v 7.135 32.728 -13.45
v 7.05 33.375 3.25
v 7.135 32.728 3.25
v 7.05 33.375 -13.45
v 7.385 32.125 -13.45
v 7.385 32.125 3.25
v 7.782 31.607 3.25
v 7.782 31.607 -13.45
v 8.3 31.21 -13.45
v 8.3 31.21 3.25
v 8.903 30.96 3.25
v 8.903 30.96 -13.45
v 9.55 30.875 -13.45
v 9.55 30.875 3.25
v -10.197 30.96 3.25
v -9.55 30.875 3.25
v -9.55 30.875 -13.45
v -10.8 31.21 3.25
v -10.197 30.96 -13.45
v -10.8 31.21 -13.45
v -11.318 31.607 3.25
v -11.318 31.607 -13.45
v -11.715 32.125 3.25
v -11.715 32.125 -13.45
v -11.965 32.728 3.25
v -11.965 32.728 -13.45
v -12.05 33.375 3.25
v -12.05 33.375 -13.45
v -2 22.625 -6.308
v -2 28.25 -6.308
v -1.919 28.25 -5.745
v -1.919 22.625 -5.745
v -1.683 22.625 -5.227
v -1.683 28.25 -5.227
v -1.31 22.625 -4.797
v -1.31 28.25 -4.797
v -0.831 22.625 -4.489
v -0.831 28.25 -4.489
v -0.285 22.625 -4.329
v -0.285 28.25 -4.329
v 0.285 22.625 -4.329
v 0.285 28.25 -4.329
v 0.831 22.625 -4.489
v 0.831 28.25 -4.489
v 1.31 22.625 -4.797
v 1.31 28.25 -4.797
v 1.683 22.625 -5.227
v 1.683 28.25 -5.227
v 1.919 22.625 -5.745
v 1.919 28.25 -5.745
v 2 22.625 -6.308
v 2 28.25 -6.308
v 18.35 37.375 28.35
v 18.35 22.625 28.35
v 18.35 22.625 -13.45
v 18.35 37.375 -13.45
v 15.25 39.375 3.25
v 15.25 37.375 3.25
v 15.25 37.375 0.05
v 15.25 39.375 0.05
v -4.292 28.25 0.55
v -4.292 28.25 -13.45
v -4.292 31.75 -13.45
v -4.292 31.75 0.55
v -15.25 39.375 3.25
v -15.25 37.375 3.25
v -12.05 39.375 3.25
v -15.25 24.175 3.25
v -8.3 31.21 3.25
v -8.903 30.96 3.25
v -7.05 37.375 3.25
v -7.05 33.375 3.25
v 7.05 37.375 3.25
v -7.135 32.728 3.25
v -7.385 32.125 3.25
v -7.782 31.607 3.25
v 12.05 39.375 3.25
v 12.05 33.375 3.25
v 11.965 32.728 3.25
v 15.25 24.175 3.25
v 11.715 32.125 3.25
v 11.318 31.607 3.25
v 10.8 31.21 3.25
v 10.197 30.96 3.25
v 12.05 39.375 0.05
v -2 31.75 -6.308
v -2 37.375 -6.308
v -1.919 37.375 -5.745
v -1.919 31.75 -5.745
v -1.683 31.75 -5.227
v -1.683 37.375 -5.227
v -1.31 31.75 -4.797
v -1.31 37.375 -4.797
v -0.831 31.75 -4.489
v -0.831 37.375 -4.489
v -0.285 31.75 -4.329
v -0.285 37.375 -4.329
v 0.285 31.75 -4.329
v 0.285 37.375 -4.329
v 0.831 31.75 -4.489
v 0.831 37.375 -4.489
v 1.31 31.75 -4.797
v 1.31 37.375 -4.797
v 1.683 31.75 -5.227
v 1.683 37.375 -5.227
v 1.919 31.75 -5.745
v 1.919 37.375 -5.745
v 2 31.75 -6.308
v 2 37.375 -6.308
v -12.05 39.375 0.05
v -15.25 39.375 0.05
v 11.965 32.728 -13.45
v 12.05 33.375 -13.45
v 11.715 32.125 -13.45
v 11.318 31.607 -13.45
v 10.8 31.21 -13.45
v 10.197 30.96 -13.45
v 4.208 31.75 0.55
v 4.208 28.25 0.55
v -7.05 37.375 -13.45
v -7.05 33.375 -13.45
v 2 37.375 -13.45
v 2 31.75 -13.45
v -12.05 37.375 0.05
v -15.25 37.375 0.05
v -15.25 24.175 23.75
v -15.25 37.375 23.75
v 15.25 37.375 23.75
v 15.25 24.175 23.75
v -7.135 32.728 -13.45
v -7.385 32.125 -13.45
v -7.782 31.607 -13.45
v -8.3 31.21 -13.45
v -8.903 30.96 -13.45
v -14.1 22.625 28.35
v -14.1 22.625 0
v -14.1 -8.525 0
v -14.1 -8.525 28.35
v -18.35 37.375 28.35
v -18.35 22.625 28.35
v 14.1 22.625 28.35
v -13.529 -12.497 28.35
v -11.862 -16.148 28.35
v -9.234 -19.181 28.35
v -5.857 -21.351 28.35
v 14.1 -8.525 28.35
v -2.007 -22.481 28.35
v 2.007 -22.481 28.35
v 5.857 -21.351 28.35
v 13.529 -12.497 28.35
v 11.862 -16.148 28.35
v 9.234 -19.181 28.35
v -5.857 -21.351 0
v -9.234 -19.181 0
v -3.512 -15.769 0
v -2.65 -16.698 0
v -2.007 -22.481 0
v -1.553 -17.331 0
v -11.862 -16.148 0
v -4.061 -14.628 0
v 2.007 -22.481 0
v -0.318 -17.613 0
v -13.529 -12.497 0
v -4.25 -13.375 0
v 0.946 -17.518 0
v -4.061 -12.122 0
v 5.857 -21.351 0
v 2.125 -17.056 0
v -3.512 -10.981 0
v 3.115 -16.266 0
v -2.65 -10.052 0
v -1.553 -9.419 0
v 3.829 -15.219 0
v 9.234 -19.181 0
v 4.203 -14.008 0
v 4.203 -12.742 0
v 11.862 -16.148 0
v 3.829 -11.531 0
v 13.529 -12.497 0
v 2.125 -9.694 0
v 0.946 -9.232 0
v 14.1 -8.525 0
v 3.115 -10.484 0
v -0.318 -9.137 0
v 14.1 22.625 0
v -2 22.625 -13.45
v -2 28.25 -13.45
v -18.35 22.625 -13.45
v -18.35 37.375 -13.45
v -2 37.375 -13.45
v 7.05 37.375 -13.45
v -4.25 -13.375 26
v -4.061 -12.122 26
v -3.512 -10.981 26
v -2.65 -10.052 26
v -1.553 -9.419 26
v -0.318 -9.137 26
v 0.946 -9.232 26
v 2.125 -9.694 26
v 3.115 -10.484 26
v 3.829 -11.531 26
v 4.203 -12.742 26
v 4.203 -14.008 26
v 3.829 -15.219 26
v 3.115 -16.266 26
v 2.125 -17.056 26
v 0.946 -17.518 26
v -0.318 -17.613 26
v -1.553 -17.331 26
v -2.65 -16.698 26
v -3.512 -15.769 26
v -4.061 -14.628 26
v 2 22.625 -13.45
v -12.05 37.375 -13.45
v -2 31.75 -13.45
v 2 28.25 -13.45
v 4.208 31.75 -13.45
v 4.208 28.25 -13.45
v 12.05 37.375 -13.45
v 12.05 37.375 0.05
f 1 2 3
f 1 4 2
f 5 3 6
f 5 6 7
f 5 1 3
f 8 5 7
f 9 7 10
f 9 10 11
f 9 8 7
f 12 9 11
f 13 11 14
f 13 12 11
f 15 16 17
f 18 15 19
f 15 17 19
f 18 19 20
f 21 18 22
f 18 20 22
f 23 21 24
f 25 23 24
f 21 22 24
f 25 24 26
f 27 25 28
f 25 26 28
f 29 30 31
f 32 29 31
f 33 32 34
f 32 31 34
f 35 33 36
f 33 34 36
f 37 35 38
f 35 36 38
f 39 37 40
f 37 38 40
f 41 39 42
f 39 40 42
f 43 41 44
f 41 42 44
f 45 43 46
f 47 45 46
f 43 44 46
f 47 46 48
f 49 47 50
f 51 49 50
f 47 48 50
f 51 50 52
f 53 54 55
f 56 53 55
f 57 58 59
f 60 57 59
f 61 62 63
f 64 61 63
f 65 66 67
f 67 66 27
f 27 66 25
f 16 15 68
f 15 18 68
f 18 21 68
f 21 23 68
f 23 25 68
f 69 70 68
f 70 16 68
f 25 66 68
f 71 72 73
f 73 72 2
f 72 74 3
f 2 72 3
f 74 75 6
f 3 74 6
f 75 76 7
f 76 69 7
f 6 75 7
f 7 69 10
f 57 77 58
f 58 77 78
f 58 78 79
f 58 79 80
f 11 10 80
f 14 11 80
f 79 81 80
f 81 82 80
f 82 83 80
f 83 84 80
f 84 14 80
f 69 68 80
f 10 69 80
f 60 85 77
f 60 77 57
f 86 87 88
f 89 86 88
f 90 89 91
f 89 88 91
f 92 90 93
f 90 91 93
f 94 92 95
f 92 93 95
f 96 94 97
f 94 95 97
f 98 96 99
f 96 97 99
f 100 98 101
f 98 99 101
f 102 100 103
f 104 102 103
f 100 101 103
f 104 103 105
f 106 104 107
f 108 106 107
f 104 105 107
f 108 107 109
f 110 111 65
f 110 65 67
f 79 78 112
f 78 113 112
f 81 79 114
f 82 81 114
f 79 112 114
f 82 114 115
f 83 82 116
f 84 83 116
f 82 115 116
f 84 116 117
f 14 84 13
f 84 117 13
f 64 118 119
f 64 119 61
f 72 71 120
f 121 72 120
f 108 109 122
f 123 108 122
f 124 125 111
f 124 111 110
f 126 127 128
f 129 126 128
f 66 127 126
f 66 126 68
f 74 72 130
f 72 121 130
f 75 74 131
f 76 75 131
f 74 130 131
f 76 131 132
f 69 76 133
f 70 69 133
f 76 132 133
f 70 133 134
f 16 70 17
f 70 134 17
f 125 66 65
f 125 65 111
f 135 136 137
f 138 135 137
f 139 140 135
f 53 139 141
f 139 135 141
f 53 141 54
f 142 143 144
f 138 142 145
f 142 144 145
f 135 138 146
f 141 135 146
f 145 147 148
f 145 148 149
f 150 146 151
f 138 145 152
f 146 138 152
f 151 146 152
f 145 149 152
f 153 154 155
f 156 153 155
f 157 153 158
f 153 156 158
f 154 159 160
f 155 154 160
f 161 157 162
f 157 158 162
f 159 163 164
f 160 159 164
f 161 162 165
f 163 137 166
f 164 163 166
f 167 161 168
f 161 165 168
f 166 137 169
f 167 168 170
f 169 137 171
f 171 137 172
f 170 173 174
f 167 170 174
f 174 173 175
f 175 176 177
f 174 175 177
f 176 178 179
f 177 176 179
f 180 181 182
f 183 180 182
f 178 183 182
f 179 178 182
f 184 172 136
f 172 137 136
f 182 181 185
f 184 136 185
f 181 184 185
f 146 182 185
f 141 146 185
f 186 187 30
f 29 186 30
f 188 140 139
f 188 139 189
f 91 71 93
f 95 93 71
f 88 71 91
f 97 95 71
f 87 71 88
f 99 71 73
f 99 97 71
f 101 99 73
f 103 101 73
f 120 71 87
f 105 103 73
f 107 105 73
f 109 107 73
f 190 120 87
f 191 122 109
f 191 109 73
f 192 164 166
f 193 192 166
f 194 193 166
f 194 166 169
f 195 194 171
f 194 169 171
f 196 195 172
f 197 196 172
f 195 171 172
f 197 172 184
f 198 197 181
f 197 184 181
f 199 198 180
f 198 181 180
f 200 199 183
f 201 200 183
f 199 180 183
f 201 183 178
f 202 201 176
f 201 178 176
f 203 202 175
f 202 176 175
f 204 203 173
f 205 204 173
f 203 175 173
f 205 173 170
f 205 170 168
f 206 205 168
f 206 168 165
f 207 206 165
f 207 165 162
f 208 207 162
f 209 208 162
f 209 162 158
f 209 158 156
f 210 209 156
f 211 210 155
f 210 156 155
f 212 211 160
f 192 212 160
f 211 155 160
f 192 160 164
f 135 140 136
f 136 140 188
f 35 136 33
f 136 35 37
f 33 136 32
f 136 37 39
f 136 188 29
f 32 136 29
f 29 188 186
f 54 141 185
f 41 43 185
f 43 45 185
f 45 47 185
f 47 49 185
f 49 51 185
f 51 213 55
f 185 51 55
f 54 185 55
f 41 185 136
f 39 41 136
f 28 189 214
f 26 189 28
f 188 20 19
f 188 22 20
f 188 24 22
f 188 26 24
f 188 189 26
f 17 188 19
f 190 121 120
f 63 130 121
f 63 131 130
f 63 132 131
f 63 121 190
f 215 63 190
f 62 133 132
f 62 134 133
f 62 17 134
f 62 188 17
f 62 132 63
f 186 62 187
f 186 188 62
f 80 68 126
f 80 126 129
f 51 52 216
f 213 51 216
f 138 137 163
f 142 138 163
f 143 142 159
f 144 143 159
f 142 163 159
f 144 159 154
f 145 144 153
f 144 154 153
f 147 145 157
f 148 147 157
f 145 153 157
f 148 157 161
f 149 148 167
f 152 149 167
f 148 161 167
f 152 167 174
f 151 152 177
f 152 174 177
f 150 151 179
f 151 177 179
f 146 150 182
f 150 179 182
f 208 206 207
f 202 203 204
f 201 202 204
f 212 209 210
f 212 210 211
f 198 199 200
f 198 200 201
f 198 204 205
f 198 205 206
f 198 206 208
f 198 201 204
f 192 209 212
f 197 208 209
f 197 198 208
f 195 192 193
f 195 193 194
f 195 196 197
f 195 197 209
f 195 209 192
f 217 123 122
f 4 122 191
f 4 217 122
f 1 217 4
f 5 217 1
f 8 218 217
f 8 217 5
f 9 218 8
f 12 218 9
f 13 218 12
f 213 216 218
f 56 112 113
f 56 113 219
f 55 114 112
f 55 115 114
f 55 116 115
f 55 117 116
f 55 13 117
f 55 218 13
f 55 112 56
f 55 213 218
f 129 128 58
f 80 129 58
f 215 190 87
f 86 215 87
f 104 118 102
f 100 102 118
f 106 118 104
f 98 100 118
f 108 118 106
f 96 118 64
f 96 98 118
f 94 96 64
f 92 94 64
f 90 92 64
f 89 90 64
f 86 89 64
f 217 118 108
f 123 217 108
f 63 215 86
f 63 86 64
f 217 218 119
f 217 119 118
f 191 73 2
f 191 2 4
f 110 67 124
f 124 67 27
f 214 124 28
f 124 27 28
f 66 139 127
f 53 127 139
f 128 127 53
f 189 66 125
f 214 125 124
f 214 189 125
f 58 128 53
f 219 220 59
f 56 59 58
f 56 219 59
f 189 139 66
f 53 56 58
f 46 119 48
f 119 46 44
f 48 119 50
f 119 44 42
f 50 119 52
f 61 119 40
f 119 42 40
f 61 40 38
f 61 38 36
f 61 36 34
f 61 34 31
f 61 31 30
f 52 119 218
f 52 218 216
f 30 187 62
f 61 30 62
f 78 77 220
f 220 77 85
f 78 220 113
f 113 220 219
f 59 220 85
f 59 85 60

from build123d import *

# Parameters (mm, degrees)
RESSALTO_EXTRUS_O1_DEPTH = 28.35
ESBO_O2_R                = 4.25
CORTE_EXTRUS_O1_DEPTH    = 26
ESBO_O3_W                = 36.7
ESBO_O3_H                = 41.8
RESSALTO_EXTRUS_O2_DEPTH = 14.75
ESBO_O5_W                = 30.5
ESBO_O5_H                = 20.5
CORTE_EXTRUS_O2_DEPTH    = 13.2
CORTE_EXTRUS_O3_DEPTH    = 69.850889609
ESBO_O7_W                = 5
ESBO_O7_H                = 16.7
CORTE_EXTRUS_O4_DEPTH    = 6.5
FILETE1_R                = 2.5
ESBO_O8_W                = 8.5
ESBO_O8_H                = 3.5
CORTE_EXTRUS_O5_DEPTH    = 14
ESBO_O9_W                = 3.2
ESBO_O9_H                = 3.2
RESSALTO_EXTRUS_O3_DEPTH = 2


with BuildPart() as part:
    # Esboço1 → Ressalto-extrusão1 (new body)
    with BuildSketch(Plane.XY):
        with BuildLine():
            Line((14.1, -8.525), (14.1, 22.625))
            Line((14.1, 22.625), (-14.1, 22.625))
            Line((-14.1, 22.625), (-14.1, -8.525))
            ThreePointArc((-14.1, -8.525), (0, -22.625), (14.1, -8.525))
        make_face()
    extrude(amount=RESSALTO_EXTRUS_O1_DEPTH)

    # Esboço2 → Corte-extrusão1 (cut)
    with BuildSketch(Plane(origin=(0, 0, 0), x_dir=(-1, 0, 0), z_dir=(0, 0, -1))):
        with Locations((0, -13.375)):
            Circle(ESBO_O2_R)
    extrude(amount=-CORTE_EXTRUS_O1_DEPTH, mode=Mode.SUBTRACT)

    # Esboço3 → Ressalto-extrusão2 (add)
    with BuildSketch(Plane(origin=(0, 22.625, 0), x_dir=(1, 0, 0), z_dir=(0, 1, 0))):
        with Locations((0, -7.45)):
            Rectangle(ESBO_O3_W, ESBO_O3_H)
    extrude(amount=RESSALTO_EXTRUS_O2_DEPTH)

    # Esboço5 → Corte-extrusão2 (cut)
    with BuildSketch(Plane(origin=(0, 37.375, 0), x_dir=(1, 0, 0), z_dir=(0, 1, 0))):
        with Locations((0, -13.5)):
            Rectangle(ESBO_O5_W, ESBO_O5_H)
    extrude(amount=-CORTE_EXTRUS_O2_DEPTH, mode=Mode.SUBTRACT)

    # Esboço6 → Corte-extrusão3 (cut, through all)
    with BuildSketch(Plane(origin=(0, 37.375, 0), x_dir=(1, 0, 0), z_dir=(0, 1, 0))):
        with BuildLine():
            Line((-2, 13.45), (-2, 6.30835312))
            ThreePointArc((-2, 6.30835312), (0, 4.30835312), (2, 6.30835312))
            Line((2, 6.30835312), (2, 13.45))
            Line((2, 13.45), (-2, 13.45))
        make_face()
    extrude(amount=-CORTE_EXTRUS_O3_DEPTH, mode=Mode.SUBTRACT)

    # Esboço7 → Corte-extrusão4 (cut)
    with BuildSketch(Plane(origin=(0, 37.375, 0), x_dir=(1, 0, 0), z_dir=(0, 1, 0))):
        with Locations((-9.55, 5.1)):
            Rectangle(ESBO_O7_W, ESBO_O7_H)
        with Locations((9.55, 5.1)):
            Rectangle(ESBO_O7_W, ESBO_O7_H)
    extrude(amount=-CORTE_EXTRUS_O4_DEPTH, mode=Mode.SUBTRACT)

    # Filete1
    filete1_edges = [part.edges().sort_by_distance(p)[0] for p in [
        (-12.05, 30.875, -5.1),
        (-7.05, 30.875, -5.1),
        (7.05, 30.875, -5.1),
        (12.05, 30.875, -5.1),
    ]]
    fillet(filete1_edges, radius=FILETE1_R - 0.0001)  # a hair under: the kernel refuses the full size

    # Esboço8 → Corte-extrusão5 (cut)
    with BuildSketch(Plane(origin=(0, 0, -13.45), x_dir=(-1, 0, 0), z_dir=(0, 0, -1))):
        with Locations((0.04245602, 30)):
            Rectangle(ESBO_O8_W, ESBO_O8_H)
    extrude(amount=-CORTE_EXTRUS_O5_DEPTH, mode=Mode.SUBTRACT)

    # Esboço9 → Ressalto-extrusão3 (add)
    with BuildSketch(Plane(origin=(0, 37.375, 0), x_dir=(1, 0, 0), z_dir=(0, 1, 0))):
        with Locations((-13.65, -1.65)):
            Rectangle(ESBO_O9_W, ESBO_O9_H)
        with Locations((13.65, -1.65)):
            Rectangle(ESBO_O9_W, ESBO_O9_H)
    extrude(amount=RESSALTO_EXTRUS_O3_DEPTH)


solid = part.part
